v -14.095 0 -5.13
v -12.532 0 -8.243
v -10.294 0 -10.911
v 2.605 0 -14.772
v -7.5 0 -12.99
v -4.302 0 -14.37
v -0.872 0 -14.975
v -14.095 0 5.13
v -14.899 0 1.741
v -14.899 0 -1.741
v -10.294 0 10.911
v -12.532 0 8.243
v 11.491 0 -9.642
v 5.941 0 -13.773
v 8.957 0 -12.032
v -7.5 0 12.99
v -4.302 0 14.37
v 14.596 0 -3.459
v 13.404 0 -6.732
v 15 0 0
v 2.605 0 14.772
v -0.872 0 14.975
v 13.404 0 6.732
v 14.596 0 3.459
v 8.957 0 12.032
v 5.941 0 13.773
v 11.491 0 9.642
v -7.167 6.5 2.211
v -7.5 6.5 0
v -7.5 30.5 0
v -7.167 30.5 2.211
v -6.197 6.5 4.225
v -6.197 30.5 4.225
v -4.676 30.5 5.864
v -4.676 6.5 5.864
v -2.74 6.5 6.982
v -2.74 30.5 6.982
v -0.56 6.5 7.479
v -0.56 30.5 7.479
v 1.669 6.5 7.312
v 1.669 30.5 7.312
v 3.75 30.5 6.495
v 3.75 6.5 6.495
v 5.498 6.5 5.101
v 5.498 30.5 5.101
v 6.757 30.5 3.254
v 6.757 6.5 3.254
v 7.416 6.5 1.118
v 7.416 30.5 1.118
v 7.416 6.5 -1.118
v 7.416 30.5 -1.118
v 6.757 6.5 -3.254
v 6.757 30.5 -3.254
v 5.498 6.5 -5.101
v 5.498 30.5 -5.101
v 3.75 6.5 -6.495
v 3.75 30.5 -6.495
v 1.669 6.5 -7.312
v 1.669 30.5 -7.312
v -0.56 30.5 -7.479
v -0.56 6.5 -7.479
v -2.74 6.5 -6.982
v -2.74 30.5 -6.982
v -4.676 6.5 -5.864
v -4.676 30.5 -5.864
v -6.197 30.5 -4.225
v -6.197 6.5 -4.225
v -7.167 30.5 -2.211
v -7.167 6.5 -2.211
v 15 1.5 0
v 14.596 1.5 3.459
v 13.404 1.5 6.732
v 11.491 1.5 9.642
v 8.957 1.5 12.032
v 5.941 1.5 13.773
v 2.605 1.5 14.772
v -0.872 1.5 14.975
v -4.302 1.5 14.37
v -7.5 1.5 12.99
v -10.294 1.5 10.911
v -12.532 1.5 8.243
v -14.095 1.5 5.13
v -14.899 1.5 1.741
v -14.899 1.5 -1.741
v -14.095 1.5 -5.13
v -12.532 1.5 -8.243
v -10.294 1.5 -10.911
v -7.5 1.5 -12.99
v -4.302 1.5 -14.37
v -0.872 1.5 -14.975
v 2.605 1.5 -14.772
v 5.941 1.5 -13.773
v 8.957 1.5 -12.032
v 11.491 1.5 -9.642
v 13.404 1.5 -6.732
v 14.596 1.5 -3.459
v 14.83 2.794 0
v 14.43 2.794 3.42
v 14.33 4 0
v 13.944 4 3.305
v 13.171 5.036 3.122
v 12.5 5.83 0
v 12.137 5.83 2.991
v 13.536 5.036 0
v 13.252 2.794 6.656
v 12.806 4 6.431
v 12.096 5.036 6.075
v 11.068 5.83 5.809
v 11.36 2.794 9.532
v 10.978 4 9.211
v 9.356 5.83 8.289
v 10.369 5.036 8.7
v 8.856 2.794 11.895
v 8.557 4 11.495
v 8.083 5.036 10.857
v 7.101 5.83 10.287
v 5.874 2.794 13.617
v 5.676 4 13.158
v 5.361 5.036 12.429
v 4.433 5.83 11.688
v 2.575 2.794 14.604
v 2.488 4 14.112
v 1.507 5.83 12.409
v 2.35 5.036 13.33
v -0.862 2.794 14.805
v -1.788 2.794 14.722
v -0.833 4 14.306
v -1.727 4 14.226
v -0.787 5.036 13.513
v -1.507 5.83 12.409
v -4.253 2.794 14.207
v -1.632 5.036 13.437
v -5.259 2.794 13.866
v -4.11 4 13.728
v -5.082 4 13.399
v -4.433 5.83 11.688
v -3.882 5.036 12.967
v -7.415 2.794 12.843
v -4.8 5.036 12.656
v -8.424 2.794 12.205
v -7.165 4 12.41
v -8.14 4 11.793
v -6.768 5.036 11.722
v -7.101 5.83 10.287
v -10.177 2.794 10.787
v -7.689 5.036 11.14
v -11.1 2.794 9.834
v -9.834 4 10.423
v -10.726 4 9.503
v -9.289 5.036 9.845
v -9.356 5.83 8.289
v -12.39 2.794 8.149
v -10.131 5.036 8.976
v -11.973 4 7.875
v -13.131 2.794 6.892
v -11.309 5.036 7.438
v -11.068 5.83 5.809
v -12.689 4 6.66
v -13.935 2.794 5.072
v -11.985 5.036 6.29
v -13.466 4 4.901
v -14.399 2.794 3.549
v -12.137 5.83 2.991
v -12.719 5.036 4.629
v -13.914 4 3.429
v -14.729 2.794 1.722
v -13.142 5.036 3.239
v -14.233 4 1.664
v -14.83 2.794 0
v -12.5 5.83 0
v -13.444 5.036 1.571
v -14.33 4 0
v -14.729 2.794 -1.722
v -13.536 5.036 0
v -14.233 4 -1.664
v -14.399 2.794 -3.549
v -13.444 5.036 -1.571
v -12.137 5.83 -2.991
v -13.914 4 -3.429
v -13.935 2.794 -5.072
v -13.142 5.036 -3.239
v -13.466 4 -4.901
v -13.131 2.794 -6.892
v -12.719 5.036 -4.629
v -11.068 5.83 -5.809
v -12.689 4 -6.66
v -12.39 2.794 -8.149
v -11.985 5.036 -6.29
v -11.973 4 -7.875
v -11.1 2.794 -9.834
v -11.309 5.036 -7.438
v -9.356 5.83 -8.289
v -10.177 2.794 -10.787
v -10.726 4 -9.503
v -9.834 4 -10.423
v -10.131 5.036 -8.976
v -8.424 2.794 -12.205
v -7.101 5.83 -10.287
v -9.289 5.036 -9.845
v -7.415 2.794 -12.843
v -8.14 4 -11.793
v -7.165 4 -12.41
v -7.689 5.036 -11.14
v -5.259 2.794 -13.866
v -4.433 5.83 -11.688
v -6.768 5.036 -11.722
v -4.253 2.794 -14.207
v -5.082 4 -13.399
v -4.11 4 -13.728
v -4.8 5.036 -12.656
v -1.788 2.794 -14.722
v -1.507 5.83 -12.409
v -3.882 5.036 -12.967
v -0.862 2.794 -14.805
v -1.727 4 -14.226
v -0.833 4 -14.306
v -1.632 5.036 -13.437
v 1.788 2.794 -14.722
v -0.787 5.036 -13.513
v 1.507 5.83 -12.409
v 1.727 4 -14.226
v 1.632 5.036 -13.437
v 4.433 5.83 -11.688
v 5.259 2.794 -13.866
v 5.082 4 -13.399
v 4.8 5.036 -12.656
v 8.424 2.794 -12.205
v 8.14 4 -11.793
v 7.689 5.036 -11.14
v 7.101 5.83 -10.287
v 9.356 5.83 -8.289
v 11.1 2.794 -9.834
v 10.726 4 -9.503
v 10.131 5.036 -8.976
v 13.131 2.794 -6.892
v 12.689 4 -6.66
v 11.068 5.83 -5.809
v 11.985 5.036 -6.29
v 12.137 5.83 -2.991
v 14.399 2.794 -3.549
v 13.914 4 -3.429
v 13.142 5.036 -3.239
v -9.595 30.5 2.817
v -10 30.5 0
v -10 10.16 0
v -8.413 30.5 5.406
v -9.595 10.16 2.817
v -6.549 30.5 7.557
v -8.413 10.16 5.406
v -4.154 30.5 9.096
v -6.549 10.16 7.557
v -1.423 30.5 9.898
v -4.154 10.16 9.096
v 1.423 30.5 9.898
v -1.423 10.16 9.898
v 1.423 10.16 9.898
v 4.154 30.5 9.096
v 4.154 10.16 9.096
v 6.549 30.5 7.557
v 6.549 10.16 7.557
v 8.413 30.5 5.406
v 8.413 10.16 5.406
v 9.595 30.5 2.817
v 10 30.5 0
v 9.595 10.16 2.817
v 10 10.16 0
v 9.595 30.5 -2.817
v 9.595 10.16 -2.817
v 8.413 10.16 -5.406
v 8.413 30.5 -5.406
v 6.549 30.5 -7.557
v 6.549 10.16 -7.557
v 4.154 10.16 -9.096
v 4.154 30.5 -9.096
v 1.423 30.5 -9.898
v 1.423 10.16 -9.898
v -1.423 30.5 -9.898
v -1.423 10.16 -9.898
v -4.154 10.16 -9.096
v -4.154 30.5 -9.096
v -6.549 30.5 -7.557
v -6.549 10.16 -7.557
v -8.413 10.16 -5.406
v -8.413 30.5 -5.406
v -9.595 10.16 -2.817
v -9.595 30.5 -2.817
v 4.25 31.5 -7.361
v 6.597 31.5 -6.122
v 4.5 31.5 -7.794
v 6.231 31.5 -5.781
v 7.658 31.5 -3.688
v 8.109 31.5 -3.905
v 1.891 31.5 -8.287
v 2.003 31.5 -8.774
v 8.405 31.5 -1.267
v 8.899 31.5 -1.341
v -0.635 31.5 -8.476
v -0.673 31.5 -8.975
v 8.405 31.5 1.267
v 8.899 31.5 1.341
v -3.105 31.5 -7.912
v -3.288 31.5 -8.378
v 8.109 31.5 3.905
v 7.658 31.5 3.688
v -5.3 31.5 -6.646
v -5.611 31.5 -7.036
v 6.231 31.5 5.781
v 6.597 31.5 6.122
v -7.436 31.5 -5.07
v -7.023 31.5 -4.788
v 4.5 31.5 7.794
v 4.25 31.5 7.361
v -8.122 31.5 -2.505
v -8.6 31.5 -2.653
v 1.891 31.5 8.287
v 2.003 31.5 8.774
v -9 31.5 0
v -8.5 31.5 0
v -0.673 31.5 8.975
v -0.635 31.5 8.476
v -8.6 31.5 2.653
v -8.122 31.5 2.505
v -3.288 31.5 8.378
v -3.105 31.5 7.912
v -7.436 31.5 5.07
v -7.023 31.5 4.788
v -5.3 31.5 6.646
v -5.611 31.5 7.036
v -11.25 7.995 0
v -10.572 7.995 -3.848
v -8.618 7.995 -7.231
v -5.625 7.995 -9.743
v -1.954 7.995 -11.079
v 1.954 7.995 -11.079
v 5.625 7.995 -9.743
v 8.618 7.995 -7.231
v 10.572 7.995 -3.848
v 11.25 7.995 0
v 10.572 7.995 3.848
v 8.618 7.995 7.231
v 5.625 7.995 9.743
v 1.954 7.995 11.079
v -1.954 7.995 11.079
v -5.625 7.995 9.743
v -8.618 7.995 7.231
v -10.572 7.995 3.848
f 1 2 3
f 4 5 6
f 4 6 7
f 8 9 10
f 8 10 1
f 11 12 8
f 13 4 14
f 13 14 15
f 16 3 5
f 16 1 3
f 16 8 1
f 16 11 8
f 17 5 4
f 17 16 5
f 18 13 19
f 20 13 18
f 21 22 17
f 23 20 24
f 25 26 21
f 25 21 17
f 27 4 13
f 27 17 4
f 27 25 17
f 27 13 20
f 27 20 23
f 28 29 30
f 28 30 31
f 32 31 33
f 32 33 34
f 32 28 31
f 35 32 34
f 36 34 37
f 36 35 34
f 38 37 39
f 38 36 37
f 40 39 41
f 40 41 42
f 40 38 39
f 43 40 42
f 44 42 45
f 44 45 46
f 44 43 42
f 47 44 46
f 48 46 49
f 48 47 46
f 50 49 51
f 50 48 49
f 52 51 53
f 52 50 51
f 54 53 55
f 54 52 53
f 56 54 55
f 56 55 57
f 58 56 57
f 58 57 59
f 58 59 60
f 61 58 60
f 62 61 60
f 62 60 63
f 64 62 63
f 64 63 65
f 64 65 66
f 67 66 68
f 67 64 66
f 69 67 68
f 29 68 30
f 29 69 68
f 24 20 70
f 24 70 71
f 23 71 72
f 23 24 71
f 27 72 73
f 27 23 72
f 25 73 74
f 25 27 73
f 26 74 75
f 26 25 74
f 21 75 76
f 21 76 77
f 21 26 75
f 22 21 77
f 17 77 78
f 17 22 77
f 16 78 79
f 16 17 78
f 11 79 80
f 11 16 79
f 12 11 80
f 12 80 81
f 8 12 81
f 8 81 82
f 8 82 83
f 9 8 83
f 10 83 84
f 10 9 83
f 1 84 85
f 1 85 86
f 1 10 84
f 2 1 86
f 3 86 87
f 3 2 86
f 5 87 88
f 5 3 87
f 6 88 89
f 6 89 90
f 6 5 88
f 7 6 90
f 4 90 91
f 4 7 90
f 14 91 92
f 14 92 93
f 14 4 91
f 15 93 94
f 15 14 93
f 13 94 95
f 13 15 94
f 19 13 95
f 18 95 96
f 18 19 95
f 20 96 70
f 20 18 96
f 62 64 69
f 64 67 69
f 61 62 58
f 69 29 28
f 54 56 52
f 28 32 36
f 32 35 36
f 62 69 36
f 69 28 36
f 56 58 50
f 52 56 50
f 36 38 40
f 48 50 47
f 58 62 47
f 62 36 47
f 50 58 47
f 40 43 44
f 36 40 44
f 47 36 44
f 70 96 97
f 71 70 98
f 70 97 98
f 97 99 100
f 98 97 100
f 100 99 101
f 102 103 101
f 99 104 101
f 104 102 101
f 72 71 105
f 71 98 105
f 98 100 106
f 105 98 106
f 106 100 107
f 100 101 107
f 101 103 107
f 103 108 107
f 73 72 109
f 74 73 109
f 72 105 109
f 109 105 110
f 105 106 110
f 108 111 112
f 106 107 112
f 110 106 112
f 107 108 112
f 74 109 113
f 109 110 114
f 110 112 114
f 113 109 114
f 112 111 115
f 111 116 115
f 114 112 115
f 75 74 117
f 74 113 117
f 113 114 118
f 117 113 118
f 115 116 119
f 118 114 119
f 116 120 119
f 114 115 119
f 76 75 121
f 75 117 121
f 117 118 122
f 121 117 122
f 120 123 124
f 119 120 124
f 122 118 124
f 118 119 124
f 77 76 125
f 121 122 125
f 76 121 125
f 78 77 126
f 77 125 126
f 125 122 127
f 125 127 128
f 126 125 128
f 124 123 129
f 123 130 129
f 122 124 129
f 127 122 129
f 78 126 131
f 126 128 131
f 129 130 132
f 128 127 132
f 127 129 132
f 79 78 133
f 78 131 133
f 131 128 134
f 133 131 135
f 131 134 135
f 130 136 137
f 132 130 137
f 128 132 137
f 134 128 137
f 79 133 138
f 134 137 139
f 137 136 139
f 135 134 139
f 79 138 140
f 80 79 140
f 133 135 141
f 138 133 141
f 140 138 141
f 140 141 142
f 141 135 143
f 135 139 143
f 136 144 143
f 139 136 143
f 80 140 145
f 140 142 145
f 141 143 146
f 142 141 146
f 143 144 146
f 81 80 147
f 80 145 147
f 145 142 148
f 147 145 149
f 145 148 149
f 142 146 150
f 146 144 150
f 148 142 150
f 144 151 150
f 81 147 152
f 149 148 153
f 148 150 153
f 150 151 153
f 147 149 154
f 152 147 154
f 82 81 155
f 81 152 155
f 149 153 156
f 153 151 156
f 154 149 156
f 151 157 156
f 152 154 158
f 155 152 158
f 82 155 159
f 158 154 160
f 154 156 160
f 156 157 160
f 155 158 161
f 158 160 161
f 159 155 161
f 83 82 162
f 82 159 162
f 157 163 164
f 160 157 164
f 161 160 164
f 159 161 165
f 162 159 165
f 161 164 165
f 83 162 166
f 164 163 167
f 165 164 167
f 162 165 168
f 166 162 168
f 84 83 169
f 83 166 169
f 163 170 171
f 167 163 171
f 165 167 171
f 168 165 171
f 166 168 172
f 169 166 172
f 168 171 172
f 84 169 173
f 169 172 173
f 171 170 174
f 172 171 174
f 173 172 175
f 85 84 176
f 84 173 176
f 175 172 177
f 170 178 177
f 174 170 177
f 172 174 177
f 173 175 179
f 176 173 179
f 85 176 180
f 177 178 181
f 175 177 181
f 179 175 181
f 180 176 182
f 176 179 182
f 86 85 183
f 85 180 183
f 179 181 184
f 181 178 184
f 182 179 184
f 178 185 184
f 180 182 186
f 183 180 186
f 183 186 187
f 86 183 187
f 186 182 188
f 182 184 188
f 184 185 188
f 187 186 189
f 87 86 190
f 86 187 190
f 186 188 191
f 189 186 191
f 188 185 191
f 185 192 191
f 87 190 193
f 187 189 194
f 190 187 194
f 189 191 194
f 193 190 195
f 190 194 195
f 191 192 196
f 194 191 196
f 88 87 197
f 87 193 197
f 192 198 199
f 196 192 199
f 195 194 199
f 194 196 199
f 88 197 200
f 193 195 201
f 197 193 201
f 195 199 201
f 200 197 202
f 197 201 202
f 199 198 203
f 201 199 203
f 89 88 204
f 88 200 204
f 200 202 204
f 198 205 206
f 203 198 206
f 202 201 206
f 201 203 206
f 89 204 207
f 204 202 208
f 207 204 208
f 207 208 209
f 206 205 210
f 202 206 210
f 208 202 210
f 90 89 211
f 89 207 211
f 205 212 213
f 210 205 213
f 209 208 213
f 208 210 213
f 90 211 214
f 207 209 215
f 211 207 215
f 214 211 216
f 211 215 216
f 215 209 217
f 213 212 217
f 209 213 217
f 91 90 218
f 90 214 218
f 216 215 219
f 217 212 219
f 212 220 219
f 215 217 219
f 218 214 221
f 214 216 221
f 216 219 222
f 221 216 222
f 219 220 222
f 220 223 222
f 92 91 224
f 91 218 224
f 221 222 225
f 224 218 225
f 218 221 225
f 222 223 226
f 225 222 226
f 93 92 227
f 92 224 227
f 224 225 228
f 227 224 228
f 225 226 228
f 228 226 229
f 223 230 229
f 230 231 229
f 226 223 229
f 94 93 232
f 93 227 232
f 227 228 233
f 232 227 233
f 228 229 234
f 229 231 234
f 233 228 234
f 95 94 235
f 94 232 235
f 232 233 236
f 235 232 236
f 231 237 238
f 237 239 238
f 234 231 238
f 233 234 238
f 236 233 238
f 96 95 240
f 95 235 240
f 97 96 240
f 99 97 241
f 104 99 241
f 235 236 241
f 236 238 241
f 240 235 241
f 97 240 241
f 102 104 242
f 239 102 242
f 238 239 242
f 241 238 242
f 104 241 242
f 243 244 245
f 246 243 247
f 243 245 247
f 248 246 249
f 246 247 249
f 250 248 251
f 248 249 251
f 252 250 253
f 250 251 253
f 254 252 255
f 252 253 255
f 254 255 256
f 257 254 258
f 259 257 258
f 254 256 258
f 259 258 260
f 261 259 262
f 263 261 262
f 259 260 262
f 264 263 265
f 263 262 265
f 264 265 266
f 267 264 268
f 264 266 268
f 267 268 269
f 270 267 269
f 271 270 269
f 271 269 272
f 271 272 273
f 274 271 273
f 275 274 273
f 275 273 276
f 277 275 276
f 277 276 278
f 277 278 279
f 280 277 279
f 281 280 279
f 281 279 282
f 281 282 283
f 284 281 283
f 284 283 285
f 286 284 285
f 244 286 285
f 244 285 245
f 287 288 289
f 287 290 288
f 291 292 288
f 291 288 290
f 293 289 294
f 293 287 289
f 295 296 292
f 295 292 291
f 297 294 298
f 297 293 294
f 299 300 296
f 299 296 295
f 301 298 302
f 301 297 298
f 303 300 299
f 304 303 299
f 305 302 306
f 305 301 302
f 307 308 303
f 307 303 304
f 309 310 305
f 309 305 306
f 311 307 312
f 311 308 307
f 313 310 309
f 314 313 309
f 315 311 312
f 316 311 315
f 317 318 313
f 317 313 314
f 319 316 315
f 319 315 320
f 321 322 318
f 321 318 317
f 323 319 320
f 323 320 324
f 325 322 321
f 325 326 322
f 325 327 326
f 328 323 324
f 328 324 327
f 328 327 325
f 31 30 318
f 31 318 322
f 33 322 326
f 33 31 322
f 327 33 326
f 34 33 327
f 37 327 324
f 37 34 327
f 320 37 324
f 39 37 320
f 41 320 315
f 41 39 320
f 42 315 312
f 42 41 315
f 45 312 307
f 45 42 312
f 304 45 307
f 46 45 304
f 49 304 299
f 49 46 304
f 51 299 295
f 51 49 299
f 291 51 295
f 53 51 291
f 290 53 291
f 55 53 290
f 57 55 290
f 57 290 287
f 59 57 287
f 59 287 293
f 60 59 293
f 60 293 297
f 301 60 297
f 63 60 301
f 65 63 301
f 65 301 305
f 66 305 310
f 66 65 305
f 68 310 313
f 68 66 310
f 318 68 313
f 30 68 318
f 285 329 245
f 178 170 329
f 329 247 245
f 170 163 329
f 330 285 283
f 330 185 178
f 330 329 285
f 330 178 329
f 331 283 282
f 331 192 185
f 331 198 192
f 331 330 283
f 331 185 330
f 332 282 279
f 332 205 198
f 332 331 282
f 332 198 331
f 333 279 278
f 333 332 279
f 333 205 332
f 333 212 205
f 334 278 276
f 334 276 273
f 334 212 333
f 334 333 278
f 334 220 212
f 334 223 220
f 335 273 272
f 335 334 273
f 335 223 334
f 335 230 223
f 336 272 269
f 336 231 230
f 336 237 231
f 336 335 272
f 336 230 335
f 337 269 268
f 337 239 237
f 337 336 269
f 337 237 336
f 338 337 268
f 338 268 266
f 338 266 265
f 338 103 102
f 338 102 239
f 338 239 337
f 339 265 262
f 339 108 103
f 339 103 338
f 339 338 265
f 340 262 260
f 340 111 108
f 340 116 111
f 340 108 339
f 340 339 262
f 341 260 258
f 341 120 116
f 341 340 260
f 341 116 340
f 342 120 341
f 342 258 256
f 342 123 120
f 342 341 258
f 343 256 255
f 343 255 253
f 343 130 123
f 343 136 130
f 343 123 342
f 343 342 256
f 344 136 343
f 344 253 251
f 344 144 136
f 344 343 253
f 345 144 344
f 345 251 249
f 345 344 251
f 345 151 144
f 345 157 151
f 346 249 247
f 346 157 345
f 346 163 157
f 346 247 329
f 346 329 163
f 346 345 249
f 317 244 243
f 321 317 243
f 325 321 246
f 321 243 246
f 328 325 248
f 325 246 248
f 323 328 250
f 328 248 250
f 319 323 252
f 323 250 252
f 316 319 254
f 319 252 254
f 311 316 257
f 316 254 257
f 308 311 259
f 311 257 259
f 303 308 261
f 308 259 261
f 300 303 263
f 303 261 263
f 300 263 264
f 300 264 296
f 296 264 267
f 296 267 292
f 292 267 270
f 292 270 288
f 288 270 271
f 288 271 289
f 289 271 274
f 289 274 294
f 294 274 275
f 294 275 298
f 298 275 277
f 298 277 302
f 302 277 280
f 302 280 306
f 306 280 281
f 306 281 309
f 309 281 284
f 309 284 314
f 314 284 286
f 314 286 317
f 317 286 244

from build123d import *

# Parameters (mm, degrees)
F0_R        = 15
F1_DEPTH    = 6.5
F2_R        = 5
F3_R        = 10
F3_R_2      = 7.5
F4_DEPTH    = 25
F5_SIZE     = 1
F6_SIZE     = 1
F7_T2_ANGLE = 180
F7_T4_ANGLE = 180


# Not quite as in the source:
# - a fillet or chamfer that OpenCascade refuses, or shapes differently, is made with other operations: its cross-section is extruded or revolved along the edge and cut away or added


with BuildPart() as f1:
    # F0 (on Front) → F1 (new body)
    with BuildSketch(Plane.XZ):
        Circle(F0_R)
    extrude(amount=-F1_DEPTH)

    # F2
    f2_edges = [f1.edges().sort_by_distance(p)[0] for p in [
        (-15, 6.5, 0),
    ]]
    fillet(f2_edges, radius=F2_R)

    # F3 (on face) → F4 (join)
    with BuildSketch(Plane(origin=(0, 6.5, 0), x_dir=(-1, 0, 0), z_dir=(0, 1, 0))):
        Circle(F3_R)
        Circle(F3_R_2, mode=Mode.SUBTRACT)
    extrude(amount=F4_DEPTH)

    # F5
    f5_edges = [f1.edges().sort_by_distance(p)[0] for p in [
        (7.5, 31.5, 0),
    ]]
    chamfer(f5_edges, length=F5_SIZE)

    # F6
    f6_edges = [f1.edges().sort_by_distance(p)[0] for p in [
        (10, 31.5, 0),
    ]]
    chamfer(f6_edges, length=F6_SIZE)

    # F7: chamfer of 5 on 2 edges, made by hand

    # F7_s1 → F7_t2 (revolve)
    with BuildSketch(Plane.XY):
        with BuildLine():
            Line((10, 10.1602540378), (12.5, 5.8301270189))
            ThreePointArc((12.5, 5.8301270189), (11.3657058128, 6.3098698146), (10, 6.5))
            Line((10, 6.5), (10, 10.1602540378))
        make_face()
    revolve(axis=Axis((0, 6.5, 0), (0, -1, 0)), revolution_arc=F7_T2_ANGLE)

    # F7_s3 → F7_t4 (revolve)
    with BuildSketch(Plane.XY):
        with BuildLine():
            Line((-10, 10.1602540378), (-12.5, 5.8301270189))
            ThreePointArc((-12.5, 5.8301270189), (-11.3657058128, 6.3098698146), (-10, 6.5))
            Line((-10, 6.5), (-10, 10.1602540378))
        make_face()
    revolve(axis=Axis((0, 6.5, 0), (0, -1, 0)), revolution_arc=F7_T4_ANGLE)


solid = f1.part
